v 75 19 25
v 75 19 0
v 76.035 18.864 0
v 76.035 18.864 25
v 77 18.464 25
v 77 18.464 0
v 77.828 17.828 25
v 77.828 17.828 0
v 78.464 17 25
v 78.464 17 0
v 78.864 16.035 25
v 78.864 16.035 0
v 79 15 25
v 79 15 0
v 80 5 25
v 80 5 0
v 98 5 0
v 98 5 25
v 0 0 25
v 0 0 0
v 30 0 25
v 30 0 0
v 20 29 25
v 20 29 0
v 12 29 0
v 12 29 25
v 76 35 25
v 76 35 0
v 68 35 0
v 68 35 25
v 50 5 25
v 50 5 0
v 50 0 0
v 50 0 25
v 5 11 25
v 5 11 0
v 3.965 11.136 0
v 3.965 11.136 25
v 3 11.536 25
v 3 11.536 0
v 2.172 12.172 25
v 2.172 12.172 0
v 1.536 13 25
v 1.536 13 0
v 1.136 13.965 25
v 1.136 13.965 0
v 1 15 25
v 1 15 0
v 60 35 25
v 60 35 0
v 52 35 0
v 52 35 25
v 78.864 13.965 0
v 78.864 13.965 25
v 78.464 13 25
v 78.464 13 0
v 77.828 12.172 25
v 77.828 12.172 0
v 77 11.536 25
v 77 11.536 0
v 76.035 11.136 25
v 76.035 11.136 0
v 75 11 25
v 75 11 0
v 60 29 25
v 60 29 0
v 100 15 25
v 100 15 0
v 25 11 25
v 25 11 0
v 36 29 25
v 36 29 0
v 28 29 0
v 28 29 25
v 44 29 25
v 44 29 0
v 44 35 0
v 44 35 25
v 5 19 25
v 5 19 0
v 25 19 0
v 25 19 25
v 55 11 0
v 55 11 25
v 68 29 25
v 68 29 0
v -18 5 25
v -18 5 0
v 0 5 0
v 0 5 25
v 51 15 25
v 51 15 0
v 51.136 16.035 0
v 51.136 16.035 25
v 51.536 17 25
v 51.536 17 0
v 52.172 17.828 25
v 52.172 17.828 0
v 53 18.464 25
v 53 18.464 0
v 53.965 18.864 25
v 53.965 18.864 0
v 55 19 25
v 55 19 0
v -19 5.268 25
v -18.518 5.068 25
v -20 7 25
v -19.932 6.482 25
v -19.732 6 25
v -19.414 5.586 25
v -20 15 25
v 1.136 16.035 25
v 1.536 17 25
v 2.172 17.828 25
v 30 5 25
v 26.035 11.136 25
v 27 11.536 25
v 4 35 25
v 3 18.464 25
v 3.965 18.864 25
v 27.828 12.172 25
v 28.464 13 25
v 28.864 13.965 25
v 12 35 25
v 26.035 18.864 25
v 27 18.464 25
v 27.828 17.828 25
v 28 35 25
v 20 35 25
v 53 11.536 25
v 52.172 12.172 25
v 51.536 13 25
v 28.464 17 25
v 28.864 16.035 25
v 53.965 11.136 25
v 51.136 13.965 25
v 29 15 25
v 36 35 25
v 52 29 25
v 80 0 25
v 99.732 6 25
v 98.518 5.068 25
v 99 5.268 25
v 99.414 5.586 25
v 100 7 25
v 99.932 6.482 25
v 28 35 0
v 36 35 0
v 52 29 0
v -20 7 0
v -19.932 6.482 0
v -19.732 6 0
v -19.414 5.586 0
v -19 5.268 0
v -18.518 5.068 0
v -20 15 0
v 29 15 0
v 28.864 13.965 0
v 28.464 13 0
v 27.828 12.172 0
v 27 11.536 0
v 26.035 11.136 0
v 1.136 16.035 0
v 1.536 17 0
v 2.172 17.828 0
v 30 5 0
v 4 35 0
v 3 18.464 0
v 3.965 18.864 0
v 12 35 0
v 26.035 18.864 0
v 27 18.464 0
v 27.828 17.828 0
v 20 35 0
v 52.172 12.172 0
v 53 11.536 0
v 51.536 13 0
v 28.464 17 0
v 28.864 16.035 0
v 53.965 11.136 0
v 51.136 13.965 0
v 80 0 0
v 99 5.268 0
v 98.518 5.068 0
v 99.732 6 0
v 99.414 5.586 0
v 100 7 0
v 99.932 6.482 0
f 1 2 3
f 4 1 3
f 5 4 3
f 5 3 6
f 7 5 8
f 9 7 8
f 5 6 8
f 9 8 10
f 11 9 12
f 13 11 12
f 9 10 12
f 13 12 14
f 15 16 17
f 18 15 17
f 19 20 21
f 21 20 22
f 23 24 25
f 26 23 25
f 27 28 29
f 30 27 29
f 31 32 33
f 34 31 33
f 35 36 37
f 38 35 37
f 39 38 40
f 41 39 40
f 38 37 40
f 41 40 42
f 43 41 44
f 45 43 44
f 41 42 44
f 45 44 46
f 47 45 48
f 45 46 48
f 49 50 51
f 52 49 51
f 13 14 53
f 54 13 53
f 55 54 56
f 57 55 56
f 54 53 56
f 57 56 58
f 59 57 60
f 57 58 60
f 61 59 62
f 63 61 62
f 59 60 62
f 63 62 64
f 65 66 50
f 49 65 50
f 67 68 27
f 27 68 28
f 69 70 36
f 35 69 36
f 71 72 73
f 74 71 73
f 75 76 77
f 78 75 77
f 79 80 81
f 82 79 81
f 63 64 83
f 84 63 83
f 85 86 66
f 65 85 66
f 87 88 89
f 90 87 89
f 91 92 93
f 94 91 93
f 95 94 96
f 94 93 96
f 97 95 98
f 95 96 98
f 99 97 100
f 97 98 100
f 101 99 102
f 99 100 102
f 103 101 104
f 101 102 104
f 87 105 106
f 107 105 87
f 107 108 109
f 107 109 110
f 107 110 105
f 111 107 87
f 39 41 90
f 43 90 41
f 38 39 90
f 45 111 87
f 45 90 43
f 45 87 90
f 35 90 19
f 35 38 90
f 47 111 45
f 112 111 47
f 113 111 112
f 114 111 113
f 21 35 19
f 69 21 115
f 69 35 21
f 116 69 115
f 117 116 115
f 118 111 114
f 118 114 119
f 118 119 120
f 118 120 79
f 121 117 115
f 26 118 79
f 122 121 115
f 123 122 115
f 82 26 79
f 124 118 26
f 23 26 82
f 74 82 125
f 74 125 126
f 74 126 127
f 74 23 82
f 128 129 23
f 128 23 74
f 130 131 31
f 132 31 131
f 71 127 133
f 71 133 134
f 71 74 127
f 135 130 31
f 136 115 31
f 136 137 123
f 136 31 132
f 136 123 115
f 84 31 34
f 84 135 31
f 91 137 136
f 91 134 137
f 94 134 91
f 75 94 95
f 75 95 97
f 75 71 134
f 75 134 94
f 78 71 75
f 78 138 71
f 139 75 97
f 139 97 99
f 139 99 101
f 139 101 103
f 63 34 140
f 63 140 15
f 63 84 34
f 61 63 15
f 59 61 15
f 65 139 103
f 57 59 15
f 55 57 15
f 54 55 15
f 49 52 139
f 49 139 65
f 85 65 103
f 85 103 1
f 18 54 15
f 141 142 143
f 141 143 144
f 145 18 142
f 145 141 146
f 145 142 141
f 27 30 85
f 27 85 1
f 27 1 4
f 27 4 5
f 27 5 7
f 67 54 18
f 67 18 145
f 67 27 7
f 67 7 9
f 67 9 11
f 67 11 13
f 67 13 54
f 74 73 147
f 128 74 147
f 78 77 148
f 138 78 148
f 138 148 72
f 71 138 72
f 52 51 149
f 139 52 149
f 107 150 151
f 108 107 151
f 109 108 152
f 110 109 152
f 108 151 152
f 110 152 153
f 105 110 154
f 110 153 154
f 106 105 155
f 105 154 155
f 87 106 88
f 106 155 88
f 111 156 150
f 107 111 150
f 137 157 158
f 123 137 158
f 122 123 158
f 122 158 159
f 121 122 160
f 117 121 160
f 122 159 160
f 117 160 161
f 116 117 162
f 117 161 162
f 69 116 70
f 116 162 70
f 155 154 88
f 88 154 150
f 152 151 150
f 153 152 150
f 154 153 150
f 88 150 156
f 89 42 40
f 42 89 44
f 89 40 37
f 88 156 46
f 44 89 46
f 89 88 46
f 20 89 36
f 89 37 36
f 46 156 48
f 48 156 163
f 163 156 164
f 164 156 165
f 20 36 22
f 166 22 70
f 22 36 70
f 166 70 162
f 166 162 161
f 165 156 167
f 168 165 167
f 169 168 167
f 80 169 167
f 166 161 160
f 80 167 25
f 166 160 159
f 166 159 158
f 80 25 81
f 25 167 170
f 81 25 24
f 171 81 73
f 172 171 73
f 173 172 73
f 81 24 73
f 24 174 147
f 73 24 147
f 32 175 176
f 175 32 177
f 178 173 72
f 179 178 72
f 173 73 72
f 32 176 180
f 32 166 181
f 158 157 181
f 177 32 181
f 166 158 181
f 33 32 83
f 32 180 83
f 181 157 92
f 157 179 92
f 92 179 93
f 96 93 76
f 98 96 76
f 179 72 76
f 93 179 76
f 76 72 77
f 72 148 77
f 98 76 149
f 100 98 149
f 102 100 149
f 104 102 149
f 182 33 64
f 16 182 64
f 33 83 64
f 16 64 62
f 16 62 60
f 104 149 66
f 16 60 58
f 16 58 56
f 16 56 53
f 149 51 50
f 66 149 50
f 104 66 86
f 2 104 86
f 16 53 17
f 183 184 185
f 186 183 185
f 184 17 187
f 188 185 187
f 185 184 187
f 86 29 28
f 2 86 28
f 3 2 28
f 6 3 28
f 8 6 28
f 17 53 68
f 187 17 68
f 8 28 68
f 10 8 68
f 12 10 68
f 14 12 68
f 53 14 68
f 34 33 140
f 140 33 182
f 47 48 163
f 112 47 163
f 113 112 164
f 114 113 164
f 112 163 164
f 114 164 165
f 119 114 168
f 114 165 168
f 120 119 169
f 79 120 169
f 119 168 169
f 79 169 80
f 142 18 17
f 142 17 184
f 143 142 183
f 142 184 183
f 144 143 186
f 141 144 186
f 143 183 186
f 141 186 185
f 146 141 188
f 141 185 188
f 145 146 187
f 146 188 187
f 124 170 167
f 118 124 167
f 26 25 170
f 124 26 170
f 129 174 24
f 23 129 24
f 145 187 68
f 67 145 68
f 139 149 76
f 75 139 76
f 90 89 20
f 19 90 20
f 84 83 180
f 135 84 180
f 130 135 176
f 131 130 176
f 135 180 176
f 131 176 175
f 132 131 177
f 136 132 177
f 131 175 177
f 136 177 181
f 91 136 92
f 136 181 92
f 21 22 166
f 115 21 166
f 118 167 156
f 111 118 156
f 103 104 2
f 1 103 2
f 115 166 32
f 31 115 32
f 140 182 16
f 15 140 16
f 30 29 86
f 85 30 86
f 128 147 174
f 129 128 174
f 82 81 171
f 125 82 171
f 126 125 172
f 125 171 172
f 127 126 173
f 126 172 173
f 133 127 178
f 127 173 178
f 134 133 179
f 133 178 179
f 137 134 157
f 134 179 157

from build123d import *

# Parameters (mm, degrees)
F1_DEPTH = 25


with BuildPart() as f1:
    # F0 (on Top) → F1 (new body)
    with BuildSketch(Plane.XY):
        with BuildLine():
            Line((0, 5), (0, 0))
            Line((0, 0), (29, 0))
            Line((29, 0), (30, 0))
            Line((30, 0), (30, 5))
            Line((30, 5), (50, 5))
            Line((50, 5), (50, 0))
            Line((50, 0), (80, 0))
            Line((80, 0), (80, 5))
            Line((80, 5), (98, 5))
            ThreePointArc((98, 5), (99.414214, 5.585786), (100, 7))
            Line((100, 7), (100, 15))
            Line((100, 15), (76, 35))
            Line((76, 35), (68, 35))
            Line((68, 35), (68, 29))
            Line((68, 29), (60, 29))
            Line((60, 29), (60, 35))
            Line((60, 35), (52, 35))
            Line((52, 35), (52, 29))
            Line((52, 29), (44, 29))
            Line((44, 29), (44, 35))
            Line((44, 35), (36, 35))
            Line((36, 35), (36, 29))
            Line((36, 29), (28, 29))
            Line((28, 29), (28, 35))
            Line((28, 35), (20, 35))
            Line((20, 35), (20, 29))
            Line((20, 29), (12, 29))
            Line((12, 29), (12, 35))
            Line((12, 35), (4, 35))
            Line((4, 35), (-20, 15))
            Line((-20, 15), (-20, 7))
            ThreePointArc((-20, 7), (-19.414214, 5.585786), (-18, 5))
            Line((-18, 5), (0, 5))
        make_face()
        with BuildLine():
            ThreePointArc((29, 15), (27.828427, 12.171573), (25, 11))
            Line((25, 11), (5, 11))
            ThreePointArc((5, 11), (2.171573, 12.171573), (1, 15))
            ThreePointArc((1, 15), (2.171573, 17.828427), (5, 19))
            Line((5, 19), (25, 19))
            ThreePointArc((25, 19), (27.828427, 17.828427), (29, 15))
        make_face(mode=Mode.SUBTRACT)
        with BuildLine():
            ThreePointArc((55, 11), (52.171573, 12.171573), (51, 15))
            ThreePointArc((51, 15), (52.171573, 17.828427), (55, 19))
            Line((55, 19), (75, 19))
            ThreePointArc((75, 19), (77.828427, 17.828427), (79, 15))
            ThreePointArc((79, 15), (77.828427, 12.171573), (75, 11))
            Line((75, 11), (55, 11))
        make_face(mode=Mode.SUBTRACT)
    extrude(amount=F1_DEPTH)


solid = f1.part
